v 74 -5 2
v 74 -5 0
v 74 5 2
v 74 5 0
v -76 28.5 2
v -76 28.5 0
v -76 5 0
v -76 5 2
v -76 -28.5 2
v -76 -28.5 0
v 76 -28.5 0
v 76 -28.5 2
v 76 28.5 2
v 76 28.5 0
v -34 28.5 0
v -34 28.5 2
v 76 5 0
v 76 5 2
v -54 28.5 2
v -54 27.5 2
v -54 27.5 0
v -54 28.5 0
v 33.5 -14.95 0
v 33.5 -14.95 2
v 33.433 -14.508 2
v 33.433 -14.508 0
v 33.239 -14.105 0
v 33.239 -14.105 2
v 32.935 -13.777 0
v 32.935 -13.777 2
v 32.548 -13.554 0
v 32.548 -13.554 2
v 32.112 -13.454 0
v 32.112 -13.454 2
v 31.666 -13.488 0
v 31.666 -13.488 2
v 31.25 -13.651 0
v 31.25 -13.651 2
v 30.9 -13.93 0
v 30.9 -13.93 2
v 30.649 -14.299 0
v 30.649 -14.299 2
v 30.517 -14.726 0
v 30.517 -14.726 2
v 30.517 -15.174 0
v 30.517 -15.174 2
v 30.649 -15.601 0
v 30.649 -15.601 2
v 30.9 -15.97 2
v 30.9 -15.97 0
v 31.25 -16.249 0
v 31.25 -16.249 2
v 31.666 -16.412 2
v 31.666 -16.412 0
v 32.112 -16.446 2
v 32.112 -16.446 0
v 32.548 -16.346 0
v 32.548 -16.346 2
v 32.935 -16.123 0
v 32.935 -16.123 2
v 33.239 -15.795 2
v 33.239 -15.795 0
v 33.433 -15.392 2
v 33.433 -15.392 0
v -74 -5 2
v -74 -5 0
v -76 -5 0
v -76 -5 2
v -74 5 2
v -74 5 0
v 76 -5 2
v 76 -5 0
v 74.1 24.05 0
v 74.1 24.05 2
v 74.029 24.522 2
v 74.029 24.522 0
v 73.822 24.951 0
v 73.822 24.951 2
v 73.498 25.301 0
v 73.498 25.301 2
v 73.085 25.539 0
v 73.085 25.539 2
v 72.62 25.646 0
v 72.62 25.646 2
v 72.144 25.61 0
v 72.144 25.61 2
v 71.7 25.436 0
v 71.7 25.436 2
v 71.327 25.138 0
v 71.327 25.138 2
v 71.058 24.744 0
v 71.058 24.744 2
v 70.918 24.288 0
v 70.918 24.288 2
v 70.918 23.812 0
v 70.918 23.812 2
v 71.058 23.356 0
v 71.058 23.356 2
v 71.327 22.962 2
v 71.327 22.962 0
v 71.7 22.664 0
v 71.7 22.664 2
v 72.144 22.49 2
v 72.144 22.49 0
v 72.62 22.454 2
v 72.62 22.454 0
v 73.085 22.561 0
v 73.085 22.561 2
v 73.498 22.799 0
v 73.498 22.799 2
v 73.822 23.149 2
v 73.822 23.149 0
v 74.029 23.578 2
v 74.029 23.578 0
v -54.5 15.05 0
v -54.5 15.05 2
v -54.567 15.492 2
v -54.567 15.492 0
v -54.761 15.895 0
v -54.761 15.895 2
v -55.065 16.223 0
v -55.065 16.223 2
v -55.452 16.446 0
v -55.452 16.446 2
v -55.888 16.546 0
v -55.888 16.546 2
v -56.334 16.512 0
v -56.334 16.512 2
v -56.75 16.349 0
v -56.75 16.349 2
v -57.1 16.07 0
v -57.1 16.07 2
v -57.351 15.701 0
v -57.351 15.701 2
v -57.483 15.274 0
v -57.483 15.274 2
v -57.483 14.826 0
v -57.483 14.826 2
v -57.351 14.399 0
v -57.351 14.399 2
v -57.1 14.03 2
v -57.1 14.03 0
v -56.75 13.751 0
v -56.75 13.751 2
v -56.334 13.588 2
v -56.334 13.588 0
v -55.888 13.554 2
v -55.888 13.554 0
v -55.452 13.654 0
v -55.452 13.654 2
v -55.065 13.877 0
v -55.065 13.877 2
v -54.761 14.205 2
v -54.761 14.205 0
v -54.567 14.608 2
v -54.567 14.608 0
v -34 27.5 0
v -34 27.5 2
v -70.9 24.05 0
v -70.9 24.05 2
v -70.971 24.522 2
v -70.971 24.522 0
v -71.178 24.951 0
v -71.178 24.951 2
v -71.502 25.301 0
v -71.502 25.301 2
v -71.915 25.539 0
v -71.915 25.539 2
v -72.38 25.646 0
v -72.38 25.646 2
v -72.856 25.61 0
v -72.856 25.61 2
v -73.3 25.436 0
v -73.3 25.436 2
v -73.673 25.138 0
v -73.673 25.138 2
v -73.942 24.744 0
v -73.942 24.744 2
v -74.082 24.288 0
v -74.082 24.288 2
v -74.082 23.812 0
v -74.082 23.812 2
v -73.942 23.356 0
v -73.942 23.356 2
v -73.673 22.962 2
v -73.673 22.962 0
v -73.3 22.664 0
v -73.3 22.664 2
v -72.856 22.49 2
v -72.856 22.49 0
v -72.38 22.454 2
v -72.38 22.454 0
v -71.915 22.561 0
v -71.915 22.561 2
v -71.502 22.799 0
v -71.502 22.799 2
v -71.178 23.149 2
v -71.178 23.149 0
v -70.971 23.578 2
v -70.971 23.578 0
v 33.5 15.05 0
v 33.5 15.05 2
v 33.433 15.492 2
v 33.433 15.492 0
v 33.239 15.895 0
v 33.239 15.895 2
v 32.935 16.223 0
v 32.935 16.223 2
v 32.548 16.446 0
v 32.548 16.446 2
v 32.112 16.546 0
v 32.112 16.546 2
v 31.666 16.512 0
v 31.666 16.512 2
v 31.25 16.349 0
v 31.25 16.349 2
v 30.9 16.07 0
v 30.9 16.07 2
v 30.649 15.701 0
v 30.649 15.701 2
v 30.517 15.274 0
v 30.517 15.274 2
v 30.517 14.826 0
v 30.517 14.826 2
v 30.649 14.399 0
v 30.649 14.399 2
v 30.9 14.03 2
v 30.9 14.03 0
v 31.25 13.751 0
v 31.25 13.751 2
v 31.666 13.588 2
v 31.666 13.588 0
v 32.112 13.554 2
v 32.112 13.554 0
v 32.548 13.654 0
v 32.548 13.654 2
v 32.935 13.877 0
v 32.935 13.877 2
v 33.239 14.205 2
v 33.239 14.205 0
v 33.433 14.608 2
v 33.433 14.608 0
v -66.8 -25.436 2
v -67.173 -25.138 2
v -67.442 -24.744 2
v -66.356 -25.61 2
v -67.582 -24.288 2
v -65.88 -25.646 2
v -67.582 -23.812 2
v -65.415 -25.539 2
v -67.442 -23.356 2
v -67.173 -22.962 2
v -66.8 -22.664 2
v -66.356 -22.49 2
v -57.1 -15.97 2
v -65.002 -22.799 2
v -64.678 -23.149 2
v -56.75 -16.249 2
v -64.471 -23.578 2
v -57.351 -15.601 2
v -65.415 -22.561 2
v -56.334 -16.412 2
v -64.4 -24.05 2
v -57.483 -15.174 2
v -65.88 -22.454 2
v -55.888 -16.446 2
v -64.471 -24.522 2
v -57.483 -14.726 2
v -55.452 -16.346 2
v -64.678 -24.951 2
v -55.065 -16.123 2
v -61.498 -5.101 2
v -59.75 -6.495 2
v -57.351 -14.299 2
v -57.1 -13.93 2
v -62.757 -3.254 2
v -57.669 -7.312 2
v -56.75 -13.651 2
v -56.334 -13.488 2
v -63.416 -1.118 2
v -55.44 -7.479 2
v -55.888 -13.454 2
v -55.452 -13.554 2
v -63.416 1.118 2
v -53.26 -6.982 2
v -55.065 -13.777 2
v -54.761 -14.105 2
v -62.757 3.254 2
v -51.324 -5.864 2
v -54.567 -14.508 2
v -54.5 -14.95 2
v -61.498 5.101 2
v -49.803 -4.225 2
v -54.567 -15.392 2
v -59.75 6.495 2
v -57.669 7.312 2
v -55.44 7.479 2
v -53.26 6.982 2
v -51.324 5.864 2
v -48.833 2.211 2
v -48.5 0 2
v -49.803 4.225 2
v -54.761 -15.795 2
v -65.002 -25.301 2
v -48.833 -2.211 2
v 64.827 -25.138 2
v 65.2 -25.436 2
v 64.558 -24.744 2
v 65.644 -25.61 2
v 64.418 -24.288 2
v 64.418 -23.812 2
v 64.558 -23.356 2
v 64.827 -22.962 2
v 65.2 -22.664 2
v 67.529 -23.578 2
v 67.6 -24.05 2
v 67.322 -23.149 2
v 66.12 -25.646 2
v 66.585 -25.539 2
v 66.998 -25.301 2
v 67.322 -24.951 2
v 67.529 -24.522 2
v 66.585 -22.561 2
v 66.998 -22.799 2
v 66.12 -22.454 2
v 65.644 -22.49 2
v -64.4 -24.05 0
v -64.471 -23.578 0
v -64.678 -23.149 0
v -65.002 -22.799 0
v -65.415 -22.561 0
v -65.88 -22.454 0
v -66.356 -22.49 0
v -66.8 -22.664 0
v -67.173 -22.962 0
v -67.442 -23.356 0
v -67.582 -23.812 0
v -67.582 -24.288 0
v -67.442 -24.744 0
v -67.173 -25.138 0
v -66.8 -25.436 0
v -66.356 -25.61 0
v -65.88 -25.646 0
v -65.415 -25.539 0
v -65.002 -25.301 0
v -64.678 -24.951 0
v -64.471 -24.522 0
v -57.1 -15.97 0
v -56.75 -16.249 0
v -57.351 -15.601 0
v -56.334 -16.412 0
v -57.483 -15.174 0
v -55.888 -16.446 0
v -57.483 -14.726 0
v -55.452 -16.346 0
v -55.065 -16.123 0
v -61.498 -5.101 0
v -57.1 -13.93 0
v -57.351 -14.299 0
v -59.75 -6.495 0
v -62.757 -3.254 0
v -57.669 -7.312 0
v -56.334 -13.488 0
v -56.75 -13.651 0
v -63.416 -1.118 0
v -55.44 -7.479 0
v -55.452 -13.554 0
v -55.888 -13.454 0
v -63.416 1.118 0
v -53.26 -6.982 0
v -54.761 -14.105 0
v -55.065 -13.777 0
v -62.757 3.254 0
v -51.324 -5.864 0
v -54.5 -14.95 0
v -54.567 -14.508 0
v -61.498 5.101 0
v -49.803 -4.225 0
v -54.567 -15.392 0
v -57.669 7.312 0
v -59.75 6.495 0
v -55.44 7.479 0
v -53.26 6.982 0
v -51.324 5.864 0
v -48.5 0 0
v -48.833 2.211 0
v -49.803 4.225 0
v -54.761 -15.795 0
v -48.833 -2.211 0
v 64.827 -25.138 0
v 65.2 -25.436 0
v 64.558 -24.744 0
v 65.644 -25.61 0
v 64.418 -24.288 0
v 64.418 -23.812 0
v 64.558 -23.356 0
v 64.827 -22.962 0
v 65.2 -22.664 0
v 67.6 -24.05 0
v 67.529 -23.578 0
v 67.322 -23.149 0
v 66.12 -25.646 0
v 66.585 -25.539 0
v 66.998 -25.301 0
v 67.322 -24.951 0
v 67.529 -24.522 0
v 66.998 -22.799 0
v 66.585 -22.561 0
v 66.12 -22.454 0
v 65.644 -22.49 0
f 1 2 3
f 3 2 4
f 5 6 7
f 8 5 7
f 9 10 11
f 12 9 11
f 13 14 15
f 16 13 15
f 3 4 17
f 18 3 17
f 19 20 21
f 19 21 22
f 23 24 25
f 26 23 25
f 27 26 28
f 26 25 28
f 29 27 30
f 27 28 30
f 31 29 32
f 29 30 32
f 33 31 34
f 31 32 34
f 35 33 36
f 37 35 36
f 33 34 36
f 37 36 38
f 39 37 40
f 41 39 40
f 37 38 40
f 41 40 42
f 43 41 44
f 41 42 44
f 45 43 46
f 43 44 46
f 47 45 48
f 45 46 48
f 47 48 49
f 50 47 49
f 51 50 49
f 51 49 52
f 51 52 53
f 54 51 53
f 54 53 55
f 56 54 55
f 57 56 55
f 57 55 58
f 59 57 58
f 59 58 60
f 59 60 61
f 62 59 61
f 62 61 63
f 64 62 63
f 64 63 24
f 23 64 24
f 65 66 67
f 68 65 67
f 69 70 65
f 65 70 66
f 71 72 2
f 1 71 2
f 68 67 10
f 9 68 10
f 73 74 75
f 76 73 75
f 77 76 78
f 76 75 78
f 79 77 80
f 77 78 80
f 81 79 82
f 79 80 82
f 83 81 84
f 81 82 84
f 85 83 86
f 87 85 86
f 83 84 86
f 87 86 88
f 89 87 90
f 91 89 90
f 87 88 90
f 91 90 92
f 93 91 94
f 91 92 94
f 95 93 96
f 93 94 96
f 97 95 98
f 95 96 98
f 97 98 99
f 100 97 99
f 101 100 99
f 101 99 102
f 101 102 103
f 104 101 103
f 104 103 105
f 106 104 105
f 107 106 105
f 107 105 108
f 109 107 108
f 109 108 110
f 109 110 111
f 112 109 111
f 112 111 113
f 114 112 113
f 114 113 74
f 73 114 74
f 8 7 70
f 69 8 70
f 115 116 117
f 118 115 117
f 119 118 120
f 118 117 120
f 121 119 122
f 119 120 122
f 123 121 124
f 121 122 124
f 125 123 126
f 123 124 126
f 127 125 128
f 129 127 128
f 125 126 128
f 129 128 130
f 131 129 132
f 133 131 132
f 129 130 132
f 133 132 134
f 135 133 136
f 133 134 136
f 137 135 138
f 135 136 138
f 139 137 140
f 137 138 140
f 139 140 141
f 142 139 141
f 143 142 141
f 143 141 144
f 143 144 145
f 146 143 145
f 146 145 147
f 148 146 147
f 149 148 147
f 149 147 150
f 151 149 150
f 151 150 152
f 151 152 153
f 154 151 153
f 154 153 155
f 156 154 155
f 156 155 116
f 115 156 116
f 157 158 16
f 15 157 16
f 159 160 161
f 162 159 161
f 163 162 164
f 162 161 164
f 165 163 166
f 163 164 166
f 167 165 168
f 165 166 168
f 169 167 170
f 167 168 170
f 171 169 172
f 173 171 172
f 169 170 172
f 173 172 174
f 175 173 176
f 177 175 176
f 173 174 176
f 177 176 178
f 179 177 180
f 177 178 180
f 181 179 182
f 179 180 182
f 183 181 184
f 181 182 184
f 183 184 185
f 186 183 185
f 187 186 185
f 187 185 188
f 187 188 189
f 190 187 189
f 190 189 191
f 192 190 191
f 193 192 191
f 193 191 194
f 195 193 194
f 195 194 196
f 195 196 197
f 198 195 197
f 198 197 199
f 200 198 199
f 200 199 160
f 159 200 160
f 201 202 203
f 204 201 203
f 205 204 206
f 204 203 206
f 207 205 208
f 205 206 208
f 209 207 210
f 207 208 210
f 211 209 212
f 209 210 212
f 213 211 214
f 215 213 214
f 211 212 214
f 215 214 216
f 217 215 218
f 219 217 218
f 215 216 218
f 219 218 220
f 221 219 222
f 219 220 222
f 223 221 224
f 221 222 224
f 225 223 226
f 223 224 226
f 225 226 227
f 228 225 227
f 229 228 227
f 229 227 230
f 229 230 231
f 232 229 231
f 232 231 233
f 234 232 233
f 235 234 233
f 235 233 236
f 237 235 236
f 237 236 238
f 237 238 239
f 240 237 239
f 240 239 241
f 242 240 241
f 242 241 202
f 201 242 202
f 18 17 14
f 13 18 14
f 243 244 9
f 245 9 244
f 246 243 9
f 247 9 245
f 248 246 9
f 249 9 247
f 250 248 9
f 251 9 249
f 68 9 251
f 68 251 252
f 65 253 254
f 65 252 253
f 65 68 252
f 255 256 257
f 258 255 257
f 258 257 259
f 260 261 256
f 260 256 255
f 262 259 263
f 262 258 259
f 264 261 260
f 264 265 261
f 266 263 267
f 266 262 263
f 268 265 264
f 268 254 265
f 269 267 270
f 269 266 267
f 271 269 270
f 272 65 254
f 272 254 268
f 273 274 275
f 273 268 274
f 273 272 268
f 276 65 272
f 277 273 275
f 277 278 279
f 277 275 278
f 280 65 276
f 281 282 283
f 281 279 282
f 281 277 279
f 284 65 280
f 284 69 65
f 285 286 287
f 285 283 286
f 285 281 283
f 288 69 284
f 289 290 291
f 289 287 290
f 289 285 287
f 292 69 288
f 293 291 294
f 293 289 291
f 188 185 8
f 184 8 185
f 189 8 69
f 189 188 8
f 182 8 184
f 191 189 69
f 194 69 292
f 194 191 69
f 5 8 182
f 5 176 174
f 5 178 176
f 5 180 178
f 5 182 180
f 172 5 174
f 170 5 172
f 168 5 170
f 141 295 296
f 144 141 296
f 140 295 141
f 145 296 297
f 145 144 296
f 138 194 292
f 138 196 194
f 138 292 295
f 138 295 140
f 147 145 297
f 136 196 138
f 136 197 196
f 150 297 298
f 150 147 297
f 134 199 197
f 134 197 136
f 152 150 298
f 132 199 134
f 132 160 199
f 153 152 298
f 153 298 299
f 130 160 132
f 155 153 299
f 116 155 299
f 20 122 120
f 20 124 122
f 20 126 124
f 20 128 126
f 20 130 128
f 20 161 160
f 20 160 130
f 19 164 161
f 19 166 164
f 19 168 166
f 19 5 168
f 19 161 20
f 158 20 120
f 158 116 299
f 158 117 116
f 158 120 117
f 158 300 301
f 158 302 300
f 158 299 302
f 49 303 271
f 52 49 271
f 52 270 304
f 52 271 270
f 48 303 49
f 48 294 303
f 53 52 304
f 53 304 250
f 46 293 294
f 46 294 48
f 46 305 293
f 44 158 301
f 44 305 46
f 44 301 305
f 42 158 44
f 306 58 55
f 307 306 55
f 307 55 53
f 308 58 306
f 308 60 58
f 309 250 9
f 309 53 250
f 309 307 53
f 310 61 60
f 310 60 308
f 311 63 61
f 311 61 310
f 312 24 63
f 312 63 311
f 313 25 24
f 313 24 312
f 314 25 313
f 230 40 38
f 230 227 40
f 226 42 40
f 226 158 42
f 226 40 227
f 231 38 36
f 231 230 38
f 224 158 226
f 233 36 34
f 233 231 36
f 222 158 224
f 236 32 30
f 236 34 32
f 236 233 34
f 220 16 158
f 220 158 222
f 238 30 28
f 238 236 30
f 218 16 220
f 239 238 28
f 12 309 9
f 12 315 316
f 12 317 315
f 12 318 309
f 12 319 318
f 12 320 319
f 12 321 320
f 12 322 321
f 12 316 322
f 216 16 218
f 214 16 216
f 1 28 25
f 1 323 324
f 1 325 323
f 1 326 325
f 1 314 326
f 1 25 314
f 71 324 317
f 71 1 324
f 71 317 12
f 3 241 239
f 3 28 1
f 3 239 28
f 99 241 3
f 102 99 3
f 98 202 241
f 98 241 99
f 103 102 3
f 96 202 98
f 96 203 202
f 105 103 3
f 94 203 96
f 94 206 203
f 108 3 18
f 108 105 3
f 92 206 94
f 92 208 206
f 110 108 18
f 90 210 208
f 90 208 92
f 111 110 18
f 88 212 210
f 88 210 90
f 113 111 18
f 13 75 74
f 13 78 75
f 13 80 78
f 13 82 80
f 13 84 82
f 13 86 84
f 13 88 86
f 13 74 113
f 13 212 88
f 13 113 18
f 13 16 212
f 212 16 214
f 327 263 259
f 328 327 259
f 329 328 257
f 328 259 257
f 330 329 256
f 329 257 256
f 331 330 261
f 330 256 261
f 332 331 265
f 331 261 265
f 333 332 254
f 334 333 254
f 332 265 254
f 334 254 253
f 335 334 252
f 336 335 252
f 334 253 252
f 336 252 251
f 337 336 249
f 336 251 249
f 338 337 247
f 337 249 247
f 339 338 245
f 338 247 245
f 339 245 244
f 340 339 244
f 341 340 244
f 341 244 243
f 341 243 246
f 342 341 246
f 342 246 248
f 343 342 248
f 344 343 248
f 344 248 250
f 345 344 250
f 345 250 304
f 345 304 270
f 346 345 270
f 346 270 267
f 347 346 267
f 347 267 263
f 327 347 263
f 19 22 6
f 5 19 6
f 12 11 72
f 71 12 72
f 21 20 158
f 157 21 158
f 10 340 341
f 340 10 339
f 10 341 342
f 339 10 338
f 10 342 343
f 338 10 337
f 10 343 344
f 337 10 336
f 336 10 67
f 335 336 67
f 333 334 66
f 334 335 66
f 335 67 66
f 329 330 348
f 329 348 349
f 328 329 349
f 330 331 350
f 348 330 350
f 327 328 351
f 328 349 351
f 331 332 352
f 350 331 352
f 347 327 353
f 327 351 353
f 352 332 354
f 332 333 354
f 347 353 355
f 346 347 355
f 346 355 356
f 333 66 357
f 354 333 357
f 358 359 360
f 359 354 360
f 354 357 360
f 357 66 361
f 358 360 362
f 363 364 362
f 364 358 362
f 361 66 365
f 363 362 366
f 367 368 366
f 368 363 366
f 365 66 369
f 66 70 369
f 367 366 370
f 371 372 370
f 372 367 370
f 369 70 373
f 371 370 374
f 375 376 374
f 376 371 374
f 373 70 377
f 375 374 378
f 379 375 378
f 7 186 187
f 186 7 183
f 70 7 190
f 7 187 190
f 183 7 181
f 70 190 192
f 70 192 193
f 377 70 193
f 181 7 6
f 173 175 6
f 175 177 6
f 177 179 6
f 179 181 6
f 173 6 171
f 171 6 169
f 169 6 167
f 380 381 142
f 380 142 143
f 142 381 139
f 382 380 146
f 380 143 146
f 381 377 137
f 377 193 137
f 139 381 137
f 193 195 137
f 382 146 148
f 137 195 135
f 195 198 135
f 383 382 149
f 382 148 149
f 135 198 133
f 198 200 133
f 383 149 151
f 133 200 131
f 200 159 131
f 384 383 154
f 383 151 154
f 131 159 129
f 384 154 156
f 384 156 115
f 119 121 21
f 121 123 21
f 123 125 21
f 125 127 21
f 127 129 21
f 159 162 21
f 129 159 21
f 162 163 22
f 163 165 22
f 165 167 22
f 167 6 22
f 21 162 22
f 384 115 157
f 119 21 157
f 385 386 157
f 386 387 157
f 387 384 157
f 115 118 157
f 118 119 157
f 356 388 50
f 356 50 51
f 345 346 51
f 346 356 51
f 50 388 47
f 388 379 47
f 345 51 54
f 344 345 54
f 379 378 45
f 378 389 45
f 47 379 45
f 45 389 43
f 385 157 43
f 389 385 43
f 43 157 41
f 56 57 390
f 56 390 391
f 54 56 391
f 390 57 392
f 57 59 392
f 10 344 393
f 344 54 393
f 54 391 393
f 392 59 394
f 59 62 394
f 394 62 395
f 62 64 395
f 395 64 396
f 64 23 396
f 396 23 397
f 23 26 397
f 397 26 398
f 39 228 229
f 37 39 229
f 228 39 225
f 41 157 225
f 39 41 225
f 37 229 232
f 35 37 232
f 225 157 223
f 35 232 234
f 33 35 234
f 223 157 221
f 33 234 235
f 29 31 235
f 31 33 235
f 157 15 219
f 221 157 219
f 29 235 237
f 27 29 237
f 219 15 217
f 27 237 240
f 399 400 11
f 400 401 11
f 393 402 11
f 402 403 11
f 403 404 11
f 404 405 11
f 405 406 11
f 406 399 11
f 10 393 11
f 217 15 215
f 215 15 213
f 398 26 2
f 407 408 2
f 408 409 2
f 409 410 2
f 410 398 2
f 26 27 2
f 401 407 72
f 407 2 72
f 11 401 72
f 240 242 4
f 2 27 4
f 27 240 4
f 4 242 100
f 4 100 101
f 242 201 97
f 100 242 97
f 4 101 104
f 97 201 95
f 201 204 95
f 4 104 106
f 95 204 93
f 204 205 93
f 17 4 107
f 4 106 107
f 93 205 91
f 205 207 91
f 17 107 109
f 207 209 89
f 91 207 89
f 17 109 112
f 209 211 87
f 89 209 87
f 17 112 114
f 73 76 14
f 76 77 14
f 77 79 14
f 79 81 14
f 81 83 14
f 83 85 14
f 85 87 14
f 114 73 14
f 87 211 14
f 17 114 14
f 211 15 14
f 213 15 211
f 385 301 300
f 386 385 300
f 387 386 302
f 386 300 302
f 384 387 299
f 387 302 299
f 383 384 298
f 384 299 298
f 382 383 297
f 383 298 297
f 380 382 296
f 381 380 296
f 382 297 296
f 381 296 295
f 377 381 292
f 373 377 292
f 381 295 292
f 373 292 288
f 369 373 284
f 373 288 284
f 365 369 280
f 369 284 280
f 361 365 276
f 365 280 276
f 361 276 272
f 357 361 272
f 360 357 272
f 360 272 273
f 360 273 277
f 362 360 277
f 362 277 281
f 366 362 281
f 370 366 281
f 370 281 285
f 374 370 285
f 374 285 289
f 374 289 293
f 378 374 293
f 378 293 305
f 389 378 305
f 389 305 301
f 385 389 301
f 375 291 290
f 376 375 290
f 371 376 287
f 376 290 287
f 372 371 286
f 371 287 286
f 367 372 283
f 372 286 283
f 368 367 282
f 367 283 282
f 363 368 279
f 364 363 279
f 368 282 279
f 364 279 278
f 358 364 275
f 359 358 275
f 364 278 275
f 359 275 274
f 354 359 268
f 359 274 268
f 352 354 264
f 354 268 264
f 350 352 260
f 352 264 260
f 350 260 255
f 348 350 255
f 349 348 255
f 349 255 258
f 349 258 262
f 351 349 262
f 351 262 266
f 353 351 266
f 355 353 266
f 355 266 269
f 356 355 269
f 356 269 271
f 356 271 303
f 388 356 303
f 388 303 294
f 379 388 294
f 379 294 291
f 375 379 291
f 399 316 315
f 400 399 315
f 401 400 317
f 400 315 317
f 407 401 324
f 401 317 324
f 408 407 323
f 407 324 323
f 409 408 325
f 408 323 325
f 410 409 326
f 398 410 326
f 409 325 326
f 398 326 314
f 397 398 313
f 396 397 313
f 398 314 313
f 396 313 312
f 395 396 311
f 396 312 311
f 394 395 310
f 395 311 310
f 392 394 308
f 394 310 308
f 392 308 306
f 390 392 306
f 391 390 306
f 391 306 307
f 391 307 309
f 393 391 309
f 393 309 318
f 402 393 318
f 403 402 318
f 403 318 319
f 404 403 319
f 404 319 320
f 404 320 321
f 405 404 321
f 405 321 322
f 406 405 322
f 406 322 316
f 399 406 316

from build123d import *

# Parameters (mm, degrees)
BOSS_EXTRUDE1_DEPTH     = 2
SKETCH2_R               = 1.6
SKETCH2_R_2             = 7.5
CUT_EXTRUDE1_DEPTH      = 3
SKETCH3_R               = 1.5
SKETCH3_W               = 20
SKETCH3_H               = 1
CUT_EXTRUDE2_DEPTH      = 1
CUT_EXTRUDE2_DEPTH_BACK = 3


with BuildPart() as part:
    # Sketch1 → Boss-Extrude1 (new body)
    with BuildSketch(Plane.XY):
        Polygon((76, 28.5), (-76, 28.5), (-76, 5), (-74, 5), (-74, -5), (-76, -5), (-76, -28.5), (76, -28.5), (76, -5), (74, -5), (74, 5), (76, 5), align=None)
    extrude(amount=BOSS_EXTRUDE1_DEPTH)

    # Sketch2 → Cut-Extrude1 (cut, through all)
    with BuildSketch(Plane.XY.offset(2)):
        with Locations((-72.5, 24.05)):
            Circle(SKETCH2_R)
        with Locations((72.5, 24.05)):
            Circle(SKETCH2_R)
        with Locations((66, -24.05)):
            Circle(SKETCH2_R)
        with Locations((-66, -24.05)):
            Circle(SKETCH2_R)
        with Locations((-56, 0)):
            Circle(SKETCH2_R_2)
    extrude(amount=-CUT_EXTRUDE1_DEPTH, mode=Mode.SUBTRACT)

    # Sketch3 → Cut-Extrude2 (cut, two sides)
    with BuildSketch(Plane.XY.offset(2)) as cut_extrude2_sk:
        with Locations((32, -14.95)):
            Circle(SKETCH3_R)
        with Locations((-56, 15.05)):
            Circle(SKETCH3_R)
        with Locations((-56, -14.95)):
            Circle(SKETCH3_R)
        with Locations((32, 15.05)):
            Circle(SKETCH3_R)
        with Locations((-44, 28)):
            Rectangle(SKETCH3_W, SKETCH3_H)
    extrude(amount=CUT_EXTRUDE2_DEPTH, mode=Mode.SUBTRACT)
    extrude(cut_extrude2_sk.sketch, amount=-CUT_EXTRUDE2_DEPTH_BACK, mode=Mode.SUBTRACT)


solid = part.part
